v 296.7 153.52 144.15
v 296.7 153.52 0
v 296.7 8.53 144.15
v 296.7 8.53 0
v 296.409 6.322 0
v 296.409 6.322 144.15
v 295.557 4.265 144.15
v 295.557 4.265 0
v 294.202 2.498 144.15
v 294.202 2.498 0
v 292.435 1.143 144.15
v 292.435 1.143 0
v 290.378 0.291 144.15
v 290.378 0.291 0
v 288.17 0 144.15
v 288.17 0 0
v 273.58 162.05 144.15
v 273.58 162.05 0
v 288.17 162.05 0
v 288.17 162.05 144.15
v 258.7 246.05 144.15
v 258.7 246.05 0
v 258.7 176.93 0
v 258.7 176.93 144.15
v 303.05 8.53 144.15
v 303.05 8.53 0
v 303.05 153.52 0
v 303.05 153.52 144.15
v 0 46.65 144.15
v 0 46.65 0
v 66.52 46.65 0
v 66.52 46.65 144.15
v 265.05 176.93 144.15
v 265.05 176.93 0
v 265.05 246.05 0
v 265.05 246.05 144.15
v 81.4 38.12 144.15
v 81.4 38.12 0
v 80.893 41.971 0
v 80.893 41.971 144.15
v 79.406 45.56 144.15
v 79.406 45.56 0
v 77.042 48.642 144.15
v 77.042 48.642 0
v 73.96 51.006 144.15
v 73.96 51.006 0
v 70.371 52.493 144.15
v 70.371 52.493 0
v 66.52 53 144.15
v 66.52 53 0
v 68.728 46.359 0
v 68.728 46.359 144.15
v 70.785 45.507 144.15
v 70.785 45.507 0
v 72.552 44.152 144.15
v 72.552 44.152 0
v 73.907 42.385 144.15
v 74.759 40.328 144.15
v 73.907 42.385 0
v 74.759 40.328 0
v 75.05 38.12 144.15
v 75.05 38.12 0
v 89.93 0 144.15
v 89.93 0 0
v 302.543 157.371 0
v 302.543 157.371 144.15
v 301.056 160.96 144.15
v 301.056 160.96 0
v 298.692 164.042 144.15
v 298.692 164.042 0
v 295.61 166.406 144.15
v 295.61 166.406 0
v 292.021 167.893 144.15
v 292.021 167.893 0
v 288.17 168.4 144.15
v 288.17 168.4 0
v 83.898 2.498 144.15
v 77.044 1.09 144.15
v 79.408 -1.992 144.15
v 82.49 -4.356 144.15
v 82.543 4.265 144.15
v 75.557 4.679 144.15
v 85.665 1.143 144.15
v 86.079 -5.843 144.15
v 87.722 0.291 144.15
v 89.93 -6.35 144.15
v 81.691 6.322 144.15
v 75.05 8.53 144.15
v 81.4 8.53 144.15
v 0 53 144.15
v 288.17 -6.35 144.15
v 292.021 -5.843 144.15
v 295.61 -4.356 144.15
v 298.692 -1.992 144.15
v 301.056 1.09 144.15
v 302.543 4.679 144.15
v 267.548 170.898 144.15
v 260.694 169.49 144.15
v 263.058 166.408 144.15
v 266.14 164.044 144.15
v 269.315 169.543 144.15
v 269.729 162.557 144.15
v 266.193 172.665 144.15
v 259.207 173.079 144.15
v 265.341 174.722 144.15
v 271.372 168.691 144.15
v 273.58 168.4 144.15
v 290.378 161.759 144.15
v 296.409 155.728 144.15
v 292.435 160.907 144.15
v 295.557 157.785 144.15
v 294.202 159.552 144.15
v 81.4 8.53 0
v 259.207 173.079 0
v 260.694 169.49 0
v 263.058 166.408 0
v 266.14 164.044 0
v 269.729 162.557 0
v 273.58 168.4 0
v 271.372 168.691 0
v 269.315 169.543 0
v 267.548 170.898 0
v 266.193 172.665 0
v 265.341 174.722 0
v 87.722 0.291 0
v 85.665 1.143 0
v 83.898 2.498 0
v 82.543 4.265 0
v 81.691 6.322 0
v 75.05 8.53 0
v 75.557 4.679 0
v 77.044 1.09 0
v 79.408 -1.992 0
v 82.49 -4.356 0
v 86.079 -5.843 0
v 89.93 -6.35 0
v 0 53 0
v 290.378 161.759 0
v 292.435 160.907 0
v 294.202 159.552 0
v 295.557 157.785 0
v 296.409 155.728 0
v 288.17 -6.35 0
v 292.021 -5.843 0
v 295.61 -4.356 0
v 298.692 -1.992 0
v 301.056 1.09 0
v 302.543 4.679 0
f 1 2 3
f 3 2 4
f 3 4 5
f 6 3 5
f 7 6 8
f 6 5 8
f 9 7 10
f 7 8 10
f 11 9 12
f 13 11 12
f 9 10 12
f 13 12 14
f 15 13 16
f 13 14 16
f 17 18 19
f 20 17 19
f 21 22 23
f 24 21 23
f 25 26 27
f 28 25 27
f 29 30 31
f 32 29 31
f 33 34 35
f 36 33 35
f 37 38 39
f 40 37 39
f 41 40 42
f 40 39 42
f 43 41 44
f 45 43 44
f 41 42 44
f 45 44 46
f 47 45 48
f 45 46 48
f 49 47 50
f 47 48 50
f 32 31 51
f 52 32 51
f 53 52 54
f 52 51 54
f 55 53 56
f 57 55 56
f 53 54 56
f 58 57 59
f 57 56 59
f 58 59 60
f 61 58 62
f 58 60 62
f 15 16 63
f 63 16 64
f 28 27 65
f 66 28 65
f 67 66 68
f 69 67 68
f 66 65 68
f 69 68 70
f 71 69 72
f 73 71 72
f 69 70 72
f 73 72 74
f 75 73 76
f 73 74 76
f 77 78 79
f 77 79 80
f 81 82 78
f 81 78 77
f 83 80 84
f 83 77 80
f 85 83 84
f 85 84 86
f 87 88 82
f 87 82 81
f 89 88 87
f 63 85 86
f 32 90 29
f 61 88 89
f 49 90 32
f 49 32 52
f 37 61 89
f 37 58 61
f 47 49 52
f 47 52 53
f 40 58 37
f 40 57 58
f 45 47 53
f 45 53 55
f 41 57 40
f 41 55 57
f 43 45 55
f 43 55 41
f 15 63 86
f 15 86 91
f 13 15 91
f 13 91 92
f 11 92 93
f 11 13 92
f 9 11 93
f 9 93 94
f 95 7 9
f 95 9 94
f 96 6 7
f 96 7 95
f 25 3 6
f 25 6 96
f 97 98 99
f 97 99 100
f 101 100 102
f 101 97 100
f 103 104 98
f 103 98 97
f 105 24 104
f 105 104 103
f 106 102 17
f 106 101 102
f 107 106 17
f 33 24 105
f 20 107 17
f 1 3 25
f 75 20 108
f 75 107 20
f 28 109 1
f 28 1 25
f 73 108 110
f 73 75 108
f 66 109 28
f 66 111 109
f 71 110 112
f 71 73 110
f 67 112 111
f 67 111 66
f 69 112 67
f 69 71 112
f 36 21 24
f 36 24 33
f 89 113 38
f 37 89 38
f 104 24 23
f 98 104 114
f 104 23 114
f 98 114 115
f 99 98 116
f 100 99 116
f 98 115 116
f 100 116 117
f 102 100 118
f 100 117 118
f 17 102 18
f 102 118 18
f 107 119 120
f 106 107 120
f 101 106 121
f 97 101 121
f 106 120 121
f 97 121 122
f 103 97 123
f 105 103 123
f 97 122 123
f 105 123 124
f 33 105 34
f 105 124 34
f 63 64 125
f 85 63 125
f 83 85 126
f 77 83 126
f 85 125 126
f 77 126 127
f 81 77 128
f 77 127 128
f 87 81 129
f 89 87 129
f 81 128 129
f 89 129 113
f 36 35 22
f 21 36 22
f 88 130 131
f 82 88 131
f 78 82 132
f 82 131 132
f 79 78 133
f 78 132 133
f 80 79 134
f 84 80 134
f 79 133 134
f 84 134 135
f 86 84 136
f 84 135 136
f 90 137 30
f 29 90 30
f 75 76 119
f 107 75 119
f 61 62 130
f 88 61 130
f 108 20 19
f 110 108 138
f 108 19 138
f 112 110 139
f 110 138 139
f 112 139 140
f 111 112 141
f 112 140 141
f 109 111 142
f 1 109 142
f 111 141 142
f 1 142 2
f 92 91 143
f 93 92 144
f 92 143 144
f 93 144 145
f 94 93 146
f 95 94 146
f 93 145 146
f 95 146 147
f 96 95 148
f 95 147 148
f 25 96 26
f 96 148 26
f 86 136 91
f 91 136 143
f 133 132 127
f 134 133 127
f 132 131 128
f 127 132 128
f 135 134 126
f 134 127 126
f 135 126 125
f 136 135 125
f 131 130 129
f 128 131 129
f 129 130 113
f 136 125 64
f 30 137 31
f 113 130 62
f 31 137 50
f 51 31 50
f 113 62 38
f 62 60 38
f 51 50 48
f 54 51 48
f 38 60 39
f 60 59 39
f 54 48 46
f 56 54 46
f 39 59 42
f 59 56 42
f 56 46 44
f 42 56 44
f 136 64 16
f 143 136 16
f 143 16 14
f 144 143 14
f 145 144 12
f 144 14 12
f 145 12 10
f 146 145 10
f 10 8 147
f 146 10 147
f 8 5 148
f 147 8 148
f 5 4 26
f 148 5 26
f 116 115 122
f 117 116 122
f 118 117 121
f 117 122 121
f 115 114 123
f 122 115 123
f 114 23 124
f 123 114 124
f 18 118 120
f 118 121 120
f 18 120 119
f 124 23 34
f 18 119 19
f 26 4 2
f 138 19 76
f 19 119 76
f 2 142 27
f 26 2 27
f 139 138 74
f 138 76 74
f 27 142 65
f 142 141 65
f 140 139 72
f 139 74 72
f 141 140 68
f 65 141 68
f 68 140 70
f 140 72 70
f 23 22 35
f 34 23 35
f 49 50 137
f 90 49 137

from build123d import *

# Parameters (mm, degrees)
BRIDA_BASE1_DEPTH = 144.15


# Sheet-metal steps are written as plain solids
with BuildPart() as part:
    # Croquis1 → Brida base1 (new body)
    with BuildSketch(Plane.XY):
        with BuildLine():
            Line((258.7, 246.05), (258.7, 176.93))
            ThreePointArc((258.7, 176.93), (263.058251096, 166.408251096), (273.58, 162.05))
            Line((273.58, 162.05), (288.17, 162.05))
            ThreePointArc((288.17, 162.05), (294.201620844, 159.551620844), (296.7, 153.52))
            Line((296.7, 153.52), (296.7, 8.53))
            ThreePointArc((296.7, 8.53), (294.201620844, 2.498379156), (288.17, 0))
            Line((288.17, 0), (89.93, 0))
            ThreePointArc((89.93, 0), (83.898379156, 2.498379156), (81.4, 8.53))
            Line((81.4, 8.53), (81.4, 38.12))
            ThreePointArc((81.4, 38.12), (77.041748904, 48.641748904), (66.52, 53))
            Line((66.52, 53), (0, 53))
            Line((0, 53), (0, 46.65))
            Line((0, 46.65), (66.52, 46.65))
            ThreePointArc((66.52, 46.65), (72.551620844, 44.151620844), (75.05, 38.12))
            Line((75.05, 38.12), (75.05, 8.53))
            ThreePointArc((75.05, 8.53), (79.408251096, -1.991748904), (89.93, -6.35))
            Line((89.93, -6.35), (288.17, -6.35))
            ThreePointArc((288.17, -6.35), (298.691748904, -1.991748904), (303.05, 8.53))
            Line((303.05, 8.53), (303.05, 153.52))
            ThreePointArc((303.05, 153.52), (298.691748904, 164.041748904), (288.17, 168.4))
            Line((288.17, 168.4), (273.58, 168.4))
            ThreePointArc((273.58, 168.4), (267.548379156, 170.898379156), (265.05, 176.93))
            Line((265.05, 176.93), (265.05, 246.05))
            Line((265.05, 246.05), (258.7, 246.05))
        make_face()
    extrude(amount=BRIDA_BASE1_DEPTH)


solid = part.part
